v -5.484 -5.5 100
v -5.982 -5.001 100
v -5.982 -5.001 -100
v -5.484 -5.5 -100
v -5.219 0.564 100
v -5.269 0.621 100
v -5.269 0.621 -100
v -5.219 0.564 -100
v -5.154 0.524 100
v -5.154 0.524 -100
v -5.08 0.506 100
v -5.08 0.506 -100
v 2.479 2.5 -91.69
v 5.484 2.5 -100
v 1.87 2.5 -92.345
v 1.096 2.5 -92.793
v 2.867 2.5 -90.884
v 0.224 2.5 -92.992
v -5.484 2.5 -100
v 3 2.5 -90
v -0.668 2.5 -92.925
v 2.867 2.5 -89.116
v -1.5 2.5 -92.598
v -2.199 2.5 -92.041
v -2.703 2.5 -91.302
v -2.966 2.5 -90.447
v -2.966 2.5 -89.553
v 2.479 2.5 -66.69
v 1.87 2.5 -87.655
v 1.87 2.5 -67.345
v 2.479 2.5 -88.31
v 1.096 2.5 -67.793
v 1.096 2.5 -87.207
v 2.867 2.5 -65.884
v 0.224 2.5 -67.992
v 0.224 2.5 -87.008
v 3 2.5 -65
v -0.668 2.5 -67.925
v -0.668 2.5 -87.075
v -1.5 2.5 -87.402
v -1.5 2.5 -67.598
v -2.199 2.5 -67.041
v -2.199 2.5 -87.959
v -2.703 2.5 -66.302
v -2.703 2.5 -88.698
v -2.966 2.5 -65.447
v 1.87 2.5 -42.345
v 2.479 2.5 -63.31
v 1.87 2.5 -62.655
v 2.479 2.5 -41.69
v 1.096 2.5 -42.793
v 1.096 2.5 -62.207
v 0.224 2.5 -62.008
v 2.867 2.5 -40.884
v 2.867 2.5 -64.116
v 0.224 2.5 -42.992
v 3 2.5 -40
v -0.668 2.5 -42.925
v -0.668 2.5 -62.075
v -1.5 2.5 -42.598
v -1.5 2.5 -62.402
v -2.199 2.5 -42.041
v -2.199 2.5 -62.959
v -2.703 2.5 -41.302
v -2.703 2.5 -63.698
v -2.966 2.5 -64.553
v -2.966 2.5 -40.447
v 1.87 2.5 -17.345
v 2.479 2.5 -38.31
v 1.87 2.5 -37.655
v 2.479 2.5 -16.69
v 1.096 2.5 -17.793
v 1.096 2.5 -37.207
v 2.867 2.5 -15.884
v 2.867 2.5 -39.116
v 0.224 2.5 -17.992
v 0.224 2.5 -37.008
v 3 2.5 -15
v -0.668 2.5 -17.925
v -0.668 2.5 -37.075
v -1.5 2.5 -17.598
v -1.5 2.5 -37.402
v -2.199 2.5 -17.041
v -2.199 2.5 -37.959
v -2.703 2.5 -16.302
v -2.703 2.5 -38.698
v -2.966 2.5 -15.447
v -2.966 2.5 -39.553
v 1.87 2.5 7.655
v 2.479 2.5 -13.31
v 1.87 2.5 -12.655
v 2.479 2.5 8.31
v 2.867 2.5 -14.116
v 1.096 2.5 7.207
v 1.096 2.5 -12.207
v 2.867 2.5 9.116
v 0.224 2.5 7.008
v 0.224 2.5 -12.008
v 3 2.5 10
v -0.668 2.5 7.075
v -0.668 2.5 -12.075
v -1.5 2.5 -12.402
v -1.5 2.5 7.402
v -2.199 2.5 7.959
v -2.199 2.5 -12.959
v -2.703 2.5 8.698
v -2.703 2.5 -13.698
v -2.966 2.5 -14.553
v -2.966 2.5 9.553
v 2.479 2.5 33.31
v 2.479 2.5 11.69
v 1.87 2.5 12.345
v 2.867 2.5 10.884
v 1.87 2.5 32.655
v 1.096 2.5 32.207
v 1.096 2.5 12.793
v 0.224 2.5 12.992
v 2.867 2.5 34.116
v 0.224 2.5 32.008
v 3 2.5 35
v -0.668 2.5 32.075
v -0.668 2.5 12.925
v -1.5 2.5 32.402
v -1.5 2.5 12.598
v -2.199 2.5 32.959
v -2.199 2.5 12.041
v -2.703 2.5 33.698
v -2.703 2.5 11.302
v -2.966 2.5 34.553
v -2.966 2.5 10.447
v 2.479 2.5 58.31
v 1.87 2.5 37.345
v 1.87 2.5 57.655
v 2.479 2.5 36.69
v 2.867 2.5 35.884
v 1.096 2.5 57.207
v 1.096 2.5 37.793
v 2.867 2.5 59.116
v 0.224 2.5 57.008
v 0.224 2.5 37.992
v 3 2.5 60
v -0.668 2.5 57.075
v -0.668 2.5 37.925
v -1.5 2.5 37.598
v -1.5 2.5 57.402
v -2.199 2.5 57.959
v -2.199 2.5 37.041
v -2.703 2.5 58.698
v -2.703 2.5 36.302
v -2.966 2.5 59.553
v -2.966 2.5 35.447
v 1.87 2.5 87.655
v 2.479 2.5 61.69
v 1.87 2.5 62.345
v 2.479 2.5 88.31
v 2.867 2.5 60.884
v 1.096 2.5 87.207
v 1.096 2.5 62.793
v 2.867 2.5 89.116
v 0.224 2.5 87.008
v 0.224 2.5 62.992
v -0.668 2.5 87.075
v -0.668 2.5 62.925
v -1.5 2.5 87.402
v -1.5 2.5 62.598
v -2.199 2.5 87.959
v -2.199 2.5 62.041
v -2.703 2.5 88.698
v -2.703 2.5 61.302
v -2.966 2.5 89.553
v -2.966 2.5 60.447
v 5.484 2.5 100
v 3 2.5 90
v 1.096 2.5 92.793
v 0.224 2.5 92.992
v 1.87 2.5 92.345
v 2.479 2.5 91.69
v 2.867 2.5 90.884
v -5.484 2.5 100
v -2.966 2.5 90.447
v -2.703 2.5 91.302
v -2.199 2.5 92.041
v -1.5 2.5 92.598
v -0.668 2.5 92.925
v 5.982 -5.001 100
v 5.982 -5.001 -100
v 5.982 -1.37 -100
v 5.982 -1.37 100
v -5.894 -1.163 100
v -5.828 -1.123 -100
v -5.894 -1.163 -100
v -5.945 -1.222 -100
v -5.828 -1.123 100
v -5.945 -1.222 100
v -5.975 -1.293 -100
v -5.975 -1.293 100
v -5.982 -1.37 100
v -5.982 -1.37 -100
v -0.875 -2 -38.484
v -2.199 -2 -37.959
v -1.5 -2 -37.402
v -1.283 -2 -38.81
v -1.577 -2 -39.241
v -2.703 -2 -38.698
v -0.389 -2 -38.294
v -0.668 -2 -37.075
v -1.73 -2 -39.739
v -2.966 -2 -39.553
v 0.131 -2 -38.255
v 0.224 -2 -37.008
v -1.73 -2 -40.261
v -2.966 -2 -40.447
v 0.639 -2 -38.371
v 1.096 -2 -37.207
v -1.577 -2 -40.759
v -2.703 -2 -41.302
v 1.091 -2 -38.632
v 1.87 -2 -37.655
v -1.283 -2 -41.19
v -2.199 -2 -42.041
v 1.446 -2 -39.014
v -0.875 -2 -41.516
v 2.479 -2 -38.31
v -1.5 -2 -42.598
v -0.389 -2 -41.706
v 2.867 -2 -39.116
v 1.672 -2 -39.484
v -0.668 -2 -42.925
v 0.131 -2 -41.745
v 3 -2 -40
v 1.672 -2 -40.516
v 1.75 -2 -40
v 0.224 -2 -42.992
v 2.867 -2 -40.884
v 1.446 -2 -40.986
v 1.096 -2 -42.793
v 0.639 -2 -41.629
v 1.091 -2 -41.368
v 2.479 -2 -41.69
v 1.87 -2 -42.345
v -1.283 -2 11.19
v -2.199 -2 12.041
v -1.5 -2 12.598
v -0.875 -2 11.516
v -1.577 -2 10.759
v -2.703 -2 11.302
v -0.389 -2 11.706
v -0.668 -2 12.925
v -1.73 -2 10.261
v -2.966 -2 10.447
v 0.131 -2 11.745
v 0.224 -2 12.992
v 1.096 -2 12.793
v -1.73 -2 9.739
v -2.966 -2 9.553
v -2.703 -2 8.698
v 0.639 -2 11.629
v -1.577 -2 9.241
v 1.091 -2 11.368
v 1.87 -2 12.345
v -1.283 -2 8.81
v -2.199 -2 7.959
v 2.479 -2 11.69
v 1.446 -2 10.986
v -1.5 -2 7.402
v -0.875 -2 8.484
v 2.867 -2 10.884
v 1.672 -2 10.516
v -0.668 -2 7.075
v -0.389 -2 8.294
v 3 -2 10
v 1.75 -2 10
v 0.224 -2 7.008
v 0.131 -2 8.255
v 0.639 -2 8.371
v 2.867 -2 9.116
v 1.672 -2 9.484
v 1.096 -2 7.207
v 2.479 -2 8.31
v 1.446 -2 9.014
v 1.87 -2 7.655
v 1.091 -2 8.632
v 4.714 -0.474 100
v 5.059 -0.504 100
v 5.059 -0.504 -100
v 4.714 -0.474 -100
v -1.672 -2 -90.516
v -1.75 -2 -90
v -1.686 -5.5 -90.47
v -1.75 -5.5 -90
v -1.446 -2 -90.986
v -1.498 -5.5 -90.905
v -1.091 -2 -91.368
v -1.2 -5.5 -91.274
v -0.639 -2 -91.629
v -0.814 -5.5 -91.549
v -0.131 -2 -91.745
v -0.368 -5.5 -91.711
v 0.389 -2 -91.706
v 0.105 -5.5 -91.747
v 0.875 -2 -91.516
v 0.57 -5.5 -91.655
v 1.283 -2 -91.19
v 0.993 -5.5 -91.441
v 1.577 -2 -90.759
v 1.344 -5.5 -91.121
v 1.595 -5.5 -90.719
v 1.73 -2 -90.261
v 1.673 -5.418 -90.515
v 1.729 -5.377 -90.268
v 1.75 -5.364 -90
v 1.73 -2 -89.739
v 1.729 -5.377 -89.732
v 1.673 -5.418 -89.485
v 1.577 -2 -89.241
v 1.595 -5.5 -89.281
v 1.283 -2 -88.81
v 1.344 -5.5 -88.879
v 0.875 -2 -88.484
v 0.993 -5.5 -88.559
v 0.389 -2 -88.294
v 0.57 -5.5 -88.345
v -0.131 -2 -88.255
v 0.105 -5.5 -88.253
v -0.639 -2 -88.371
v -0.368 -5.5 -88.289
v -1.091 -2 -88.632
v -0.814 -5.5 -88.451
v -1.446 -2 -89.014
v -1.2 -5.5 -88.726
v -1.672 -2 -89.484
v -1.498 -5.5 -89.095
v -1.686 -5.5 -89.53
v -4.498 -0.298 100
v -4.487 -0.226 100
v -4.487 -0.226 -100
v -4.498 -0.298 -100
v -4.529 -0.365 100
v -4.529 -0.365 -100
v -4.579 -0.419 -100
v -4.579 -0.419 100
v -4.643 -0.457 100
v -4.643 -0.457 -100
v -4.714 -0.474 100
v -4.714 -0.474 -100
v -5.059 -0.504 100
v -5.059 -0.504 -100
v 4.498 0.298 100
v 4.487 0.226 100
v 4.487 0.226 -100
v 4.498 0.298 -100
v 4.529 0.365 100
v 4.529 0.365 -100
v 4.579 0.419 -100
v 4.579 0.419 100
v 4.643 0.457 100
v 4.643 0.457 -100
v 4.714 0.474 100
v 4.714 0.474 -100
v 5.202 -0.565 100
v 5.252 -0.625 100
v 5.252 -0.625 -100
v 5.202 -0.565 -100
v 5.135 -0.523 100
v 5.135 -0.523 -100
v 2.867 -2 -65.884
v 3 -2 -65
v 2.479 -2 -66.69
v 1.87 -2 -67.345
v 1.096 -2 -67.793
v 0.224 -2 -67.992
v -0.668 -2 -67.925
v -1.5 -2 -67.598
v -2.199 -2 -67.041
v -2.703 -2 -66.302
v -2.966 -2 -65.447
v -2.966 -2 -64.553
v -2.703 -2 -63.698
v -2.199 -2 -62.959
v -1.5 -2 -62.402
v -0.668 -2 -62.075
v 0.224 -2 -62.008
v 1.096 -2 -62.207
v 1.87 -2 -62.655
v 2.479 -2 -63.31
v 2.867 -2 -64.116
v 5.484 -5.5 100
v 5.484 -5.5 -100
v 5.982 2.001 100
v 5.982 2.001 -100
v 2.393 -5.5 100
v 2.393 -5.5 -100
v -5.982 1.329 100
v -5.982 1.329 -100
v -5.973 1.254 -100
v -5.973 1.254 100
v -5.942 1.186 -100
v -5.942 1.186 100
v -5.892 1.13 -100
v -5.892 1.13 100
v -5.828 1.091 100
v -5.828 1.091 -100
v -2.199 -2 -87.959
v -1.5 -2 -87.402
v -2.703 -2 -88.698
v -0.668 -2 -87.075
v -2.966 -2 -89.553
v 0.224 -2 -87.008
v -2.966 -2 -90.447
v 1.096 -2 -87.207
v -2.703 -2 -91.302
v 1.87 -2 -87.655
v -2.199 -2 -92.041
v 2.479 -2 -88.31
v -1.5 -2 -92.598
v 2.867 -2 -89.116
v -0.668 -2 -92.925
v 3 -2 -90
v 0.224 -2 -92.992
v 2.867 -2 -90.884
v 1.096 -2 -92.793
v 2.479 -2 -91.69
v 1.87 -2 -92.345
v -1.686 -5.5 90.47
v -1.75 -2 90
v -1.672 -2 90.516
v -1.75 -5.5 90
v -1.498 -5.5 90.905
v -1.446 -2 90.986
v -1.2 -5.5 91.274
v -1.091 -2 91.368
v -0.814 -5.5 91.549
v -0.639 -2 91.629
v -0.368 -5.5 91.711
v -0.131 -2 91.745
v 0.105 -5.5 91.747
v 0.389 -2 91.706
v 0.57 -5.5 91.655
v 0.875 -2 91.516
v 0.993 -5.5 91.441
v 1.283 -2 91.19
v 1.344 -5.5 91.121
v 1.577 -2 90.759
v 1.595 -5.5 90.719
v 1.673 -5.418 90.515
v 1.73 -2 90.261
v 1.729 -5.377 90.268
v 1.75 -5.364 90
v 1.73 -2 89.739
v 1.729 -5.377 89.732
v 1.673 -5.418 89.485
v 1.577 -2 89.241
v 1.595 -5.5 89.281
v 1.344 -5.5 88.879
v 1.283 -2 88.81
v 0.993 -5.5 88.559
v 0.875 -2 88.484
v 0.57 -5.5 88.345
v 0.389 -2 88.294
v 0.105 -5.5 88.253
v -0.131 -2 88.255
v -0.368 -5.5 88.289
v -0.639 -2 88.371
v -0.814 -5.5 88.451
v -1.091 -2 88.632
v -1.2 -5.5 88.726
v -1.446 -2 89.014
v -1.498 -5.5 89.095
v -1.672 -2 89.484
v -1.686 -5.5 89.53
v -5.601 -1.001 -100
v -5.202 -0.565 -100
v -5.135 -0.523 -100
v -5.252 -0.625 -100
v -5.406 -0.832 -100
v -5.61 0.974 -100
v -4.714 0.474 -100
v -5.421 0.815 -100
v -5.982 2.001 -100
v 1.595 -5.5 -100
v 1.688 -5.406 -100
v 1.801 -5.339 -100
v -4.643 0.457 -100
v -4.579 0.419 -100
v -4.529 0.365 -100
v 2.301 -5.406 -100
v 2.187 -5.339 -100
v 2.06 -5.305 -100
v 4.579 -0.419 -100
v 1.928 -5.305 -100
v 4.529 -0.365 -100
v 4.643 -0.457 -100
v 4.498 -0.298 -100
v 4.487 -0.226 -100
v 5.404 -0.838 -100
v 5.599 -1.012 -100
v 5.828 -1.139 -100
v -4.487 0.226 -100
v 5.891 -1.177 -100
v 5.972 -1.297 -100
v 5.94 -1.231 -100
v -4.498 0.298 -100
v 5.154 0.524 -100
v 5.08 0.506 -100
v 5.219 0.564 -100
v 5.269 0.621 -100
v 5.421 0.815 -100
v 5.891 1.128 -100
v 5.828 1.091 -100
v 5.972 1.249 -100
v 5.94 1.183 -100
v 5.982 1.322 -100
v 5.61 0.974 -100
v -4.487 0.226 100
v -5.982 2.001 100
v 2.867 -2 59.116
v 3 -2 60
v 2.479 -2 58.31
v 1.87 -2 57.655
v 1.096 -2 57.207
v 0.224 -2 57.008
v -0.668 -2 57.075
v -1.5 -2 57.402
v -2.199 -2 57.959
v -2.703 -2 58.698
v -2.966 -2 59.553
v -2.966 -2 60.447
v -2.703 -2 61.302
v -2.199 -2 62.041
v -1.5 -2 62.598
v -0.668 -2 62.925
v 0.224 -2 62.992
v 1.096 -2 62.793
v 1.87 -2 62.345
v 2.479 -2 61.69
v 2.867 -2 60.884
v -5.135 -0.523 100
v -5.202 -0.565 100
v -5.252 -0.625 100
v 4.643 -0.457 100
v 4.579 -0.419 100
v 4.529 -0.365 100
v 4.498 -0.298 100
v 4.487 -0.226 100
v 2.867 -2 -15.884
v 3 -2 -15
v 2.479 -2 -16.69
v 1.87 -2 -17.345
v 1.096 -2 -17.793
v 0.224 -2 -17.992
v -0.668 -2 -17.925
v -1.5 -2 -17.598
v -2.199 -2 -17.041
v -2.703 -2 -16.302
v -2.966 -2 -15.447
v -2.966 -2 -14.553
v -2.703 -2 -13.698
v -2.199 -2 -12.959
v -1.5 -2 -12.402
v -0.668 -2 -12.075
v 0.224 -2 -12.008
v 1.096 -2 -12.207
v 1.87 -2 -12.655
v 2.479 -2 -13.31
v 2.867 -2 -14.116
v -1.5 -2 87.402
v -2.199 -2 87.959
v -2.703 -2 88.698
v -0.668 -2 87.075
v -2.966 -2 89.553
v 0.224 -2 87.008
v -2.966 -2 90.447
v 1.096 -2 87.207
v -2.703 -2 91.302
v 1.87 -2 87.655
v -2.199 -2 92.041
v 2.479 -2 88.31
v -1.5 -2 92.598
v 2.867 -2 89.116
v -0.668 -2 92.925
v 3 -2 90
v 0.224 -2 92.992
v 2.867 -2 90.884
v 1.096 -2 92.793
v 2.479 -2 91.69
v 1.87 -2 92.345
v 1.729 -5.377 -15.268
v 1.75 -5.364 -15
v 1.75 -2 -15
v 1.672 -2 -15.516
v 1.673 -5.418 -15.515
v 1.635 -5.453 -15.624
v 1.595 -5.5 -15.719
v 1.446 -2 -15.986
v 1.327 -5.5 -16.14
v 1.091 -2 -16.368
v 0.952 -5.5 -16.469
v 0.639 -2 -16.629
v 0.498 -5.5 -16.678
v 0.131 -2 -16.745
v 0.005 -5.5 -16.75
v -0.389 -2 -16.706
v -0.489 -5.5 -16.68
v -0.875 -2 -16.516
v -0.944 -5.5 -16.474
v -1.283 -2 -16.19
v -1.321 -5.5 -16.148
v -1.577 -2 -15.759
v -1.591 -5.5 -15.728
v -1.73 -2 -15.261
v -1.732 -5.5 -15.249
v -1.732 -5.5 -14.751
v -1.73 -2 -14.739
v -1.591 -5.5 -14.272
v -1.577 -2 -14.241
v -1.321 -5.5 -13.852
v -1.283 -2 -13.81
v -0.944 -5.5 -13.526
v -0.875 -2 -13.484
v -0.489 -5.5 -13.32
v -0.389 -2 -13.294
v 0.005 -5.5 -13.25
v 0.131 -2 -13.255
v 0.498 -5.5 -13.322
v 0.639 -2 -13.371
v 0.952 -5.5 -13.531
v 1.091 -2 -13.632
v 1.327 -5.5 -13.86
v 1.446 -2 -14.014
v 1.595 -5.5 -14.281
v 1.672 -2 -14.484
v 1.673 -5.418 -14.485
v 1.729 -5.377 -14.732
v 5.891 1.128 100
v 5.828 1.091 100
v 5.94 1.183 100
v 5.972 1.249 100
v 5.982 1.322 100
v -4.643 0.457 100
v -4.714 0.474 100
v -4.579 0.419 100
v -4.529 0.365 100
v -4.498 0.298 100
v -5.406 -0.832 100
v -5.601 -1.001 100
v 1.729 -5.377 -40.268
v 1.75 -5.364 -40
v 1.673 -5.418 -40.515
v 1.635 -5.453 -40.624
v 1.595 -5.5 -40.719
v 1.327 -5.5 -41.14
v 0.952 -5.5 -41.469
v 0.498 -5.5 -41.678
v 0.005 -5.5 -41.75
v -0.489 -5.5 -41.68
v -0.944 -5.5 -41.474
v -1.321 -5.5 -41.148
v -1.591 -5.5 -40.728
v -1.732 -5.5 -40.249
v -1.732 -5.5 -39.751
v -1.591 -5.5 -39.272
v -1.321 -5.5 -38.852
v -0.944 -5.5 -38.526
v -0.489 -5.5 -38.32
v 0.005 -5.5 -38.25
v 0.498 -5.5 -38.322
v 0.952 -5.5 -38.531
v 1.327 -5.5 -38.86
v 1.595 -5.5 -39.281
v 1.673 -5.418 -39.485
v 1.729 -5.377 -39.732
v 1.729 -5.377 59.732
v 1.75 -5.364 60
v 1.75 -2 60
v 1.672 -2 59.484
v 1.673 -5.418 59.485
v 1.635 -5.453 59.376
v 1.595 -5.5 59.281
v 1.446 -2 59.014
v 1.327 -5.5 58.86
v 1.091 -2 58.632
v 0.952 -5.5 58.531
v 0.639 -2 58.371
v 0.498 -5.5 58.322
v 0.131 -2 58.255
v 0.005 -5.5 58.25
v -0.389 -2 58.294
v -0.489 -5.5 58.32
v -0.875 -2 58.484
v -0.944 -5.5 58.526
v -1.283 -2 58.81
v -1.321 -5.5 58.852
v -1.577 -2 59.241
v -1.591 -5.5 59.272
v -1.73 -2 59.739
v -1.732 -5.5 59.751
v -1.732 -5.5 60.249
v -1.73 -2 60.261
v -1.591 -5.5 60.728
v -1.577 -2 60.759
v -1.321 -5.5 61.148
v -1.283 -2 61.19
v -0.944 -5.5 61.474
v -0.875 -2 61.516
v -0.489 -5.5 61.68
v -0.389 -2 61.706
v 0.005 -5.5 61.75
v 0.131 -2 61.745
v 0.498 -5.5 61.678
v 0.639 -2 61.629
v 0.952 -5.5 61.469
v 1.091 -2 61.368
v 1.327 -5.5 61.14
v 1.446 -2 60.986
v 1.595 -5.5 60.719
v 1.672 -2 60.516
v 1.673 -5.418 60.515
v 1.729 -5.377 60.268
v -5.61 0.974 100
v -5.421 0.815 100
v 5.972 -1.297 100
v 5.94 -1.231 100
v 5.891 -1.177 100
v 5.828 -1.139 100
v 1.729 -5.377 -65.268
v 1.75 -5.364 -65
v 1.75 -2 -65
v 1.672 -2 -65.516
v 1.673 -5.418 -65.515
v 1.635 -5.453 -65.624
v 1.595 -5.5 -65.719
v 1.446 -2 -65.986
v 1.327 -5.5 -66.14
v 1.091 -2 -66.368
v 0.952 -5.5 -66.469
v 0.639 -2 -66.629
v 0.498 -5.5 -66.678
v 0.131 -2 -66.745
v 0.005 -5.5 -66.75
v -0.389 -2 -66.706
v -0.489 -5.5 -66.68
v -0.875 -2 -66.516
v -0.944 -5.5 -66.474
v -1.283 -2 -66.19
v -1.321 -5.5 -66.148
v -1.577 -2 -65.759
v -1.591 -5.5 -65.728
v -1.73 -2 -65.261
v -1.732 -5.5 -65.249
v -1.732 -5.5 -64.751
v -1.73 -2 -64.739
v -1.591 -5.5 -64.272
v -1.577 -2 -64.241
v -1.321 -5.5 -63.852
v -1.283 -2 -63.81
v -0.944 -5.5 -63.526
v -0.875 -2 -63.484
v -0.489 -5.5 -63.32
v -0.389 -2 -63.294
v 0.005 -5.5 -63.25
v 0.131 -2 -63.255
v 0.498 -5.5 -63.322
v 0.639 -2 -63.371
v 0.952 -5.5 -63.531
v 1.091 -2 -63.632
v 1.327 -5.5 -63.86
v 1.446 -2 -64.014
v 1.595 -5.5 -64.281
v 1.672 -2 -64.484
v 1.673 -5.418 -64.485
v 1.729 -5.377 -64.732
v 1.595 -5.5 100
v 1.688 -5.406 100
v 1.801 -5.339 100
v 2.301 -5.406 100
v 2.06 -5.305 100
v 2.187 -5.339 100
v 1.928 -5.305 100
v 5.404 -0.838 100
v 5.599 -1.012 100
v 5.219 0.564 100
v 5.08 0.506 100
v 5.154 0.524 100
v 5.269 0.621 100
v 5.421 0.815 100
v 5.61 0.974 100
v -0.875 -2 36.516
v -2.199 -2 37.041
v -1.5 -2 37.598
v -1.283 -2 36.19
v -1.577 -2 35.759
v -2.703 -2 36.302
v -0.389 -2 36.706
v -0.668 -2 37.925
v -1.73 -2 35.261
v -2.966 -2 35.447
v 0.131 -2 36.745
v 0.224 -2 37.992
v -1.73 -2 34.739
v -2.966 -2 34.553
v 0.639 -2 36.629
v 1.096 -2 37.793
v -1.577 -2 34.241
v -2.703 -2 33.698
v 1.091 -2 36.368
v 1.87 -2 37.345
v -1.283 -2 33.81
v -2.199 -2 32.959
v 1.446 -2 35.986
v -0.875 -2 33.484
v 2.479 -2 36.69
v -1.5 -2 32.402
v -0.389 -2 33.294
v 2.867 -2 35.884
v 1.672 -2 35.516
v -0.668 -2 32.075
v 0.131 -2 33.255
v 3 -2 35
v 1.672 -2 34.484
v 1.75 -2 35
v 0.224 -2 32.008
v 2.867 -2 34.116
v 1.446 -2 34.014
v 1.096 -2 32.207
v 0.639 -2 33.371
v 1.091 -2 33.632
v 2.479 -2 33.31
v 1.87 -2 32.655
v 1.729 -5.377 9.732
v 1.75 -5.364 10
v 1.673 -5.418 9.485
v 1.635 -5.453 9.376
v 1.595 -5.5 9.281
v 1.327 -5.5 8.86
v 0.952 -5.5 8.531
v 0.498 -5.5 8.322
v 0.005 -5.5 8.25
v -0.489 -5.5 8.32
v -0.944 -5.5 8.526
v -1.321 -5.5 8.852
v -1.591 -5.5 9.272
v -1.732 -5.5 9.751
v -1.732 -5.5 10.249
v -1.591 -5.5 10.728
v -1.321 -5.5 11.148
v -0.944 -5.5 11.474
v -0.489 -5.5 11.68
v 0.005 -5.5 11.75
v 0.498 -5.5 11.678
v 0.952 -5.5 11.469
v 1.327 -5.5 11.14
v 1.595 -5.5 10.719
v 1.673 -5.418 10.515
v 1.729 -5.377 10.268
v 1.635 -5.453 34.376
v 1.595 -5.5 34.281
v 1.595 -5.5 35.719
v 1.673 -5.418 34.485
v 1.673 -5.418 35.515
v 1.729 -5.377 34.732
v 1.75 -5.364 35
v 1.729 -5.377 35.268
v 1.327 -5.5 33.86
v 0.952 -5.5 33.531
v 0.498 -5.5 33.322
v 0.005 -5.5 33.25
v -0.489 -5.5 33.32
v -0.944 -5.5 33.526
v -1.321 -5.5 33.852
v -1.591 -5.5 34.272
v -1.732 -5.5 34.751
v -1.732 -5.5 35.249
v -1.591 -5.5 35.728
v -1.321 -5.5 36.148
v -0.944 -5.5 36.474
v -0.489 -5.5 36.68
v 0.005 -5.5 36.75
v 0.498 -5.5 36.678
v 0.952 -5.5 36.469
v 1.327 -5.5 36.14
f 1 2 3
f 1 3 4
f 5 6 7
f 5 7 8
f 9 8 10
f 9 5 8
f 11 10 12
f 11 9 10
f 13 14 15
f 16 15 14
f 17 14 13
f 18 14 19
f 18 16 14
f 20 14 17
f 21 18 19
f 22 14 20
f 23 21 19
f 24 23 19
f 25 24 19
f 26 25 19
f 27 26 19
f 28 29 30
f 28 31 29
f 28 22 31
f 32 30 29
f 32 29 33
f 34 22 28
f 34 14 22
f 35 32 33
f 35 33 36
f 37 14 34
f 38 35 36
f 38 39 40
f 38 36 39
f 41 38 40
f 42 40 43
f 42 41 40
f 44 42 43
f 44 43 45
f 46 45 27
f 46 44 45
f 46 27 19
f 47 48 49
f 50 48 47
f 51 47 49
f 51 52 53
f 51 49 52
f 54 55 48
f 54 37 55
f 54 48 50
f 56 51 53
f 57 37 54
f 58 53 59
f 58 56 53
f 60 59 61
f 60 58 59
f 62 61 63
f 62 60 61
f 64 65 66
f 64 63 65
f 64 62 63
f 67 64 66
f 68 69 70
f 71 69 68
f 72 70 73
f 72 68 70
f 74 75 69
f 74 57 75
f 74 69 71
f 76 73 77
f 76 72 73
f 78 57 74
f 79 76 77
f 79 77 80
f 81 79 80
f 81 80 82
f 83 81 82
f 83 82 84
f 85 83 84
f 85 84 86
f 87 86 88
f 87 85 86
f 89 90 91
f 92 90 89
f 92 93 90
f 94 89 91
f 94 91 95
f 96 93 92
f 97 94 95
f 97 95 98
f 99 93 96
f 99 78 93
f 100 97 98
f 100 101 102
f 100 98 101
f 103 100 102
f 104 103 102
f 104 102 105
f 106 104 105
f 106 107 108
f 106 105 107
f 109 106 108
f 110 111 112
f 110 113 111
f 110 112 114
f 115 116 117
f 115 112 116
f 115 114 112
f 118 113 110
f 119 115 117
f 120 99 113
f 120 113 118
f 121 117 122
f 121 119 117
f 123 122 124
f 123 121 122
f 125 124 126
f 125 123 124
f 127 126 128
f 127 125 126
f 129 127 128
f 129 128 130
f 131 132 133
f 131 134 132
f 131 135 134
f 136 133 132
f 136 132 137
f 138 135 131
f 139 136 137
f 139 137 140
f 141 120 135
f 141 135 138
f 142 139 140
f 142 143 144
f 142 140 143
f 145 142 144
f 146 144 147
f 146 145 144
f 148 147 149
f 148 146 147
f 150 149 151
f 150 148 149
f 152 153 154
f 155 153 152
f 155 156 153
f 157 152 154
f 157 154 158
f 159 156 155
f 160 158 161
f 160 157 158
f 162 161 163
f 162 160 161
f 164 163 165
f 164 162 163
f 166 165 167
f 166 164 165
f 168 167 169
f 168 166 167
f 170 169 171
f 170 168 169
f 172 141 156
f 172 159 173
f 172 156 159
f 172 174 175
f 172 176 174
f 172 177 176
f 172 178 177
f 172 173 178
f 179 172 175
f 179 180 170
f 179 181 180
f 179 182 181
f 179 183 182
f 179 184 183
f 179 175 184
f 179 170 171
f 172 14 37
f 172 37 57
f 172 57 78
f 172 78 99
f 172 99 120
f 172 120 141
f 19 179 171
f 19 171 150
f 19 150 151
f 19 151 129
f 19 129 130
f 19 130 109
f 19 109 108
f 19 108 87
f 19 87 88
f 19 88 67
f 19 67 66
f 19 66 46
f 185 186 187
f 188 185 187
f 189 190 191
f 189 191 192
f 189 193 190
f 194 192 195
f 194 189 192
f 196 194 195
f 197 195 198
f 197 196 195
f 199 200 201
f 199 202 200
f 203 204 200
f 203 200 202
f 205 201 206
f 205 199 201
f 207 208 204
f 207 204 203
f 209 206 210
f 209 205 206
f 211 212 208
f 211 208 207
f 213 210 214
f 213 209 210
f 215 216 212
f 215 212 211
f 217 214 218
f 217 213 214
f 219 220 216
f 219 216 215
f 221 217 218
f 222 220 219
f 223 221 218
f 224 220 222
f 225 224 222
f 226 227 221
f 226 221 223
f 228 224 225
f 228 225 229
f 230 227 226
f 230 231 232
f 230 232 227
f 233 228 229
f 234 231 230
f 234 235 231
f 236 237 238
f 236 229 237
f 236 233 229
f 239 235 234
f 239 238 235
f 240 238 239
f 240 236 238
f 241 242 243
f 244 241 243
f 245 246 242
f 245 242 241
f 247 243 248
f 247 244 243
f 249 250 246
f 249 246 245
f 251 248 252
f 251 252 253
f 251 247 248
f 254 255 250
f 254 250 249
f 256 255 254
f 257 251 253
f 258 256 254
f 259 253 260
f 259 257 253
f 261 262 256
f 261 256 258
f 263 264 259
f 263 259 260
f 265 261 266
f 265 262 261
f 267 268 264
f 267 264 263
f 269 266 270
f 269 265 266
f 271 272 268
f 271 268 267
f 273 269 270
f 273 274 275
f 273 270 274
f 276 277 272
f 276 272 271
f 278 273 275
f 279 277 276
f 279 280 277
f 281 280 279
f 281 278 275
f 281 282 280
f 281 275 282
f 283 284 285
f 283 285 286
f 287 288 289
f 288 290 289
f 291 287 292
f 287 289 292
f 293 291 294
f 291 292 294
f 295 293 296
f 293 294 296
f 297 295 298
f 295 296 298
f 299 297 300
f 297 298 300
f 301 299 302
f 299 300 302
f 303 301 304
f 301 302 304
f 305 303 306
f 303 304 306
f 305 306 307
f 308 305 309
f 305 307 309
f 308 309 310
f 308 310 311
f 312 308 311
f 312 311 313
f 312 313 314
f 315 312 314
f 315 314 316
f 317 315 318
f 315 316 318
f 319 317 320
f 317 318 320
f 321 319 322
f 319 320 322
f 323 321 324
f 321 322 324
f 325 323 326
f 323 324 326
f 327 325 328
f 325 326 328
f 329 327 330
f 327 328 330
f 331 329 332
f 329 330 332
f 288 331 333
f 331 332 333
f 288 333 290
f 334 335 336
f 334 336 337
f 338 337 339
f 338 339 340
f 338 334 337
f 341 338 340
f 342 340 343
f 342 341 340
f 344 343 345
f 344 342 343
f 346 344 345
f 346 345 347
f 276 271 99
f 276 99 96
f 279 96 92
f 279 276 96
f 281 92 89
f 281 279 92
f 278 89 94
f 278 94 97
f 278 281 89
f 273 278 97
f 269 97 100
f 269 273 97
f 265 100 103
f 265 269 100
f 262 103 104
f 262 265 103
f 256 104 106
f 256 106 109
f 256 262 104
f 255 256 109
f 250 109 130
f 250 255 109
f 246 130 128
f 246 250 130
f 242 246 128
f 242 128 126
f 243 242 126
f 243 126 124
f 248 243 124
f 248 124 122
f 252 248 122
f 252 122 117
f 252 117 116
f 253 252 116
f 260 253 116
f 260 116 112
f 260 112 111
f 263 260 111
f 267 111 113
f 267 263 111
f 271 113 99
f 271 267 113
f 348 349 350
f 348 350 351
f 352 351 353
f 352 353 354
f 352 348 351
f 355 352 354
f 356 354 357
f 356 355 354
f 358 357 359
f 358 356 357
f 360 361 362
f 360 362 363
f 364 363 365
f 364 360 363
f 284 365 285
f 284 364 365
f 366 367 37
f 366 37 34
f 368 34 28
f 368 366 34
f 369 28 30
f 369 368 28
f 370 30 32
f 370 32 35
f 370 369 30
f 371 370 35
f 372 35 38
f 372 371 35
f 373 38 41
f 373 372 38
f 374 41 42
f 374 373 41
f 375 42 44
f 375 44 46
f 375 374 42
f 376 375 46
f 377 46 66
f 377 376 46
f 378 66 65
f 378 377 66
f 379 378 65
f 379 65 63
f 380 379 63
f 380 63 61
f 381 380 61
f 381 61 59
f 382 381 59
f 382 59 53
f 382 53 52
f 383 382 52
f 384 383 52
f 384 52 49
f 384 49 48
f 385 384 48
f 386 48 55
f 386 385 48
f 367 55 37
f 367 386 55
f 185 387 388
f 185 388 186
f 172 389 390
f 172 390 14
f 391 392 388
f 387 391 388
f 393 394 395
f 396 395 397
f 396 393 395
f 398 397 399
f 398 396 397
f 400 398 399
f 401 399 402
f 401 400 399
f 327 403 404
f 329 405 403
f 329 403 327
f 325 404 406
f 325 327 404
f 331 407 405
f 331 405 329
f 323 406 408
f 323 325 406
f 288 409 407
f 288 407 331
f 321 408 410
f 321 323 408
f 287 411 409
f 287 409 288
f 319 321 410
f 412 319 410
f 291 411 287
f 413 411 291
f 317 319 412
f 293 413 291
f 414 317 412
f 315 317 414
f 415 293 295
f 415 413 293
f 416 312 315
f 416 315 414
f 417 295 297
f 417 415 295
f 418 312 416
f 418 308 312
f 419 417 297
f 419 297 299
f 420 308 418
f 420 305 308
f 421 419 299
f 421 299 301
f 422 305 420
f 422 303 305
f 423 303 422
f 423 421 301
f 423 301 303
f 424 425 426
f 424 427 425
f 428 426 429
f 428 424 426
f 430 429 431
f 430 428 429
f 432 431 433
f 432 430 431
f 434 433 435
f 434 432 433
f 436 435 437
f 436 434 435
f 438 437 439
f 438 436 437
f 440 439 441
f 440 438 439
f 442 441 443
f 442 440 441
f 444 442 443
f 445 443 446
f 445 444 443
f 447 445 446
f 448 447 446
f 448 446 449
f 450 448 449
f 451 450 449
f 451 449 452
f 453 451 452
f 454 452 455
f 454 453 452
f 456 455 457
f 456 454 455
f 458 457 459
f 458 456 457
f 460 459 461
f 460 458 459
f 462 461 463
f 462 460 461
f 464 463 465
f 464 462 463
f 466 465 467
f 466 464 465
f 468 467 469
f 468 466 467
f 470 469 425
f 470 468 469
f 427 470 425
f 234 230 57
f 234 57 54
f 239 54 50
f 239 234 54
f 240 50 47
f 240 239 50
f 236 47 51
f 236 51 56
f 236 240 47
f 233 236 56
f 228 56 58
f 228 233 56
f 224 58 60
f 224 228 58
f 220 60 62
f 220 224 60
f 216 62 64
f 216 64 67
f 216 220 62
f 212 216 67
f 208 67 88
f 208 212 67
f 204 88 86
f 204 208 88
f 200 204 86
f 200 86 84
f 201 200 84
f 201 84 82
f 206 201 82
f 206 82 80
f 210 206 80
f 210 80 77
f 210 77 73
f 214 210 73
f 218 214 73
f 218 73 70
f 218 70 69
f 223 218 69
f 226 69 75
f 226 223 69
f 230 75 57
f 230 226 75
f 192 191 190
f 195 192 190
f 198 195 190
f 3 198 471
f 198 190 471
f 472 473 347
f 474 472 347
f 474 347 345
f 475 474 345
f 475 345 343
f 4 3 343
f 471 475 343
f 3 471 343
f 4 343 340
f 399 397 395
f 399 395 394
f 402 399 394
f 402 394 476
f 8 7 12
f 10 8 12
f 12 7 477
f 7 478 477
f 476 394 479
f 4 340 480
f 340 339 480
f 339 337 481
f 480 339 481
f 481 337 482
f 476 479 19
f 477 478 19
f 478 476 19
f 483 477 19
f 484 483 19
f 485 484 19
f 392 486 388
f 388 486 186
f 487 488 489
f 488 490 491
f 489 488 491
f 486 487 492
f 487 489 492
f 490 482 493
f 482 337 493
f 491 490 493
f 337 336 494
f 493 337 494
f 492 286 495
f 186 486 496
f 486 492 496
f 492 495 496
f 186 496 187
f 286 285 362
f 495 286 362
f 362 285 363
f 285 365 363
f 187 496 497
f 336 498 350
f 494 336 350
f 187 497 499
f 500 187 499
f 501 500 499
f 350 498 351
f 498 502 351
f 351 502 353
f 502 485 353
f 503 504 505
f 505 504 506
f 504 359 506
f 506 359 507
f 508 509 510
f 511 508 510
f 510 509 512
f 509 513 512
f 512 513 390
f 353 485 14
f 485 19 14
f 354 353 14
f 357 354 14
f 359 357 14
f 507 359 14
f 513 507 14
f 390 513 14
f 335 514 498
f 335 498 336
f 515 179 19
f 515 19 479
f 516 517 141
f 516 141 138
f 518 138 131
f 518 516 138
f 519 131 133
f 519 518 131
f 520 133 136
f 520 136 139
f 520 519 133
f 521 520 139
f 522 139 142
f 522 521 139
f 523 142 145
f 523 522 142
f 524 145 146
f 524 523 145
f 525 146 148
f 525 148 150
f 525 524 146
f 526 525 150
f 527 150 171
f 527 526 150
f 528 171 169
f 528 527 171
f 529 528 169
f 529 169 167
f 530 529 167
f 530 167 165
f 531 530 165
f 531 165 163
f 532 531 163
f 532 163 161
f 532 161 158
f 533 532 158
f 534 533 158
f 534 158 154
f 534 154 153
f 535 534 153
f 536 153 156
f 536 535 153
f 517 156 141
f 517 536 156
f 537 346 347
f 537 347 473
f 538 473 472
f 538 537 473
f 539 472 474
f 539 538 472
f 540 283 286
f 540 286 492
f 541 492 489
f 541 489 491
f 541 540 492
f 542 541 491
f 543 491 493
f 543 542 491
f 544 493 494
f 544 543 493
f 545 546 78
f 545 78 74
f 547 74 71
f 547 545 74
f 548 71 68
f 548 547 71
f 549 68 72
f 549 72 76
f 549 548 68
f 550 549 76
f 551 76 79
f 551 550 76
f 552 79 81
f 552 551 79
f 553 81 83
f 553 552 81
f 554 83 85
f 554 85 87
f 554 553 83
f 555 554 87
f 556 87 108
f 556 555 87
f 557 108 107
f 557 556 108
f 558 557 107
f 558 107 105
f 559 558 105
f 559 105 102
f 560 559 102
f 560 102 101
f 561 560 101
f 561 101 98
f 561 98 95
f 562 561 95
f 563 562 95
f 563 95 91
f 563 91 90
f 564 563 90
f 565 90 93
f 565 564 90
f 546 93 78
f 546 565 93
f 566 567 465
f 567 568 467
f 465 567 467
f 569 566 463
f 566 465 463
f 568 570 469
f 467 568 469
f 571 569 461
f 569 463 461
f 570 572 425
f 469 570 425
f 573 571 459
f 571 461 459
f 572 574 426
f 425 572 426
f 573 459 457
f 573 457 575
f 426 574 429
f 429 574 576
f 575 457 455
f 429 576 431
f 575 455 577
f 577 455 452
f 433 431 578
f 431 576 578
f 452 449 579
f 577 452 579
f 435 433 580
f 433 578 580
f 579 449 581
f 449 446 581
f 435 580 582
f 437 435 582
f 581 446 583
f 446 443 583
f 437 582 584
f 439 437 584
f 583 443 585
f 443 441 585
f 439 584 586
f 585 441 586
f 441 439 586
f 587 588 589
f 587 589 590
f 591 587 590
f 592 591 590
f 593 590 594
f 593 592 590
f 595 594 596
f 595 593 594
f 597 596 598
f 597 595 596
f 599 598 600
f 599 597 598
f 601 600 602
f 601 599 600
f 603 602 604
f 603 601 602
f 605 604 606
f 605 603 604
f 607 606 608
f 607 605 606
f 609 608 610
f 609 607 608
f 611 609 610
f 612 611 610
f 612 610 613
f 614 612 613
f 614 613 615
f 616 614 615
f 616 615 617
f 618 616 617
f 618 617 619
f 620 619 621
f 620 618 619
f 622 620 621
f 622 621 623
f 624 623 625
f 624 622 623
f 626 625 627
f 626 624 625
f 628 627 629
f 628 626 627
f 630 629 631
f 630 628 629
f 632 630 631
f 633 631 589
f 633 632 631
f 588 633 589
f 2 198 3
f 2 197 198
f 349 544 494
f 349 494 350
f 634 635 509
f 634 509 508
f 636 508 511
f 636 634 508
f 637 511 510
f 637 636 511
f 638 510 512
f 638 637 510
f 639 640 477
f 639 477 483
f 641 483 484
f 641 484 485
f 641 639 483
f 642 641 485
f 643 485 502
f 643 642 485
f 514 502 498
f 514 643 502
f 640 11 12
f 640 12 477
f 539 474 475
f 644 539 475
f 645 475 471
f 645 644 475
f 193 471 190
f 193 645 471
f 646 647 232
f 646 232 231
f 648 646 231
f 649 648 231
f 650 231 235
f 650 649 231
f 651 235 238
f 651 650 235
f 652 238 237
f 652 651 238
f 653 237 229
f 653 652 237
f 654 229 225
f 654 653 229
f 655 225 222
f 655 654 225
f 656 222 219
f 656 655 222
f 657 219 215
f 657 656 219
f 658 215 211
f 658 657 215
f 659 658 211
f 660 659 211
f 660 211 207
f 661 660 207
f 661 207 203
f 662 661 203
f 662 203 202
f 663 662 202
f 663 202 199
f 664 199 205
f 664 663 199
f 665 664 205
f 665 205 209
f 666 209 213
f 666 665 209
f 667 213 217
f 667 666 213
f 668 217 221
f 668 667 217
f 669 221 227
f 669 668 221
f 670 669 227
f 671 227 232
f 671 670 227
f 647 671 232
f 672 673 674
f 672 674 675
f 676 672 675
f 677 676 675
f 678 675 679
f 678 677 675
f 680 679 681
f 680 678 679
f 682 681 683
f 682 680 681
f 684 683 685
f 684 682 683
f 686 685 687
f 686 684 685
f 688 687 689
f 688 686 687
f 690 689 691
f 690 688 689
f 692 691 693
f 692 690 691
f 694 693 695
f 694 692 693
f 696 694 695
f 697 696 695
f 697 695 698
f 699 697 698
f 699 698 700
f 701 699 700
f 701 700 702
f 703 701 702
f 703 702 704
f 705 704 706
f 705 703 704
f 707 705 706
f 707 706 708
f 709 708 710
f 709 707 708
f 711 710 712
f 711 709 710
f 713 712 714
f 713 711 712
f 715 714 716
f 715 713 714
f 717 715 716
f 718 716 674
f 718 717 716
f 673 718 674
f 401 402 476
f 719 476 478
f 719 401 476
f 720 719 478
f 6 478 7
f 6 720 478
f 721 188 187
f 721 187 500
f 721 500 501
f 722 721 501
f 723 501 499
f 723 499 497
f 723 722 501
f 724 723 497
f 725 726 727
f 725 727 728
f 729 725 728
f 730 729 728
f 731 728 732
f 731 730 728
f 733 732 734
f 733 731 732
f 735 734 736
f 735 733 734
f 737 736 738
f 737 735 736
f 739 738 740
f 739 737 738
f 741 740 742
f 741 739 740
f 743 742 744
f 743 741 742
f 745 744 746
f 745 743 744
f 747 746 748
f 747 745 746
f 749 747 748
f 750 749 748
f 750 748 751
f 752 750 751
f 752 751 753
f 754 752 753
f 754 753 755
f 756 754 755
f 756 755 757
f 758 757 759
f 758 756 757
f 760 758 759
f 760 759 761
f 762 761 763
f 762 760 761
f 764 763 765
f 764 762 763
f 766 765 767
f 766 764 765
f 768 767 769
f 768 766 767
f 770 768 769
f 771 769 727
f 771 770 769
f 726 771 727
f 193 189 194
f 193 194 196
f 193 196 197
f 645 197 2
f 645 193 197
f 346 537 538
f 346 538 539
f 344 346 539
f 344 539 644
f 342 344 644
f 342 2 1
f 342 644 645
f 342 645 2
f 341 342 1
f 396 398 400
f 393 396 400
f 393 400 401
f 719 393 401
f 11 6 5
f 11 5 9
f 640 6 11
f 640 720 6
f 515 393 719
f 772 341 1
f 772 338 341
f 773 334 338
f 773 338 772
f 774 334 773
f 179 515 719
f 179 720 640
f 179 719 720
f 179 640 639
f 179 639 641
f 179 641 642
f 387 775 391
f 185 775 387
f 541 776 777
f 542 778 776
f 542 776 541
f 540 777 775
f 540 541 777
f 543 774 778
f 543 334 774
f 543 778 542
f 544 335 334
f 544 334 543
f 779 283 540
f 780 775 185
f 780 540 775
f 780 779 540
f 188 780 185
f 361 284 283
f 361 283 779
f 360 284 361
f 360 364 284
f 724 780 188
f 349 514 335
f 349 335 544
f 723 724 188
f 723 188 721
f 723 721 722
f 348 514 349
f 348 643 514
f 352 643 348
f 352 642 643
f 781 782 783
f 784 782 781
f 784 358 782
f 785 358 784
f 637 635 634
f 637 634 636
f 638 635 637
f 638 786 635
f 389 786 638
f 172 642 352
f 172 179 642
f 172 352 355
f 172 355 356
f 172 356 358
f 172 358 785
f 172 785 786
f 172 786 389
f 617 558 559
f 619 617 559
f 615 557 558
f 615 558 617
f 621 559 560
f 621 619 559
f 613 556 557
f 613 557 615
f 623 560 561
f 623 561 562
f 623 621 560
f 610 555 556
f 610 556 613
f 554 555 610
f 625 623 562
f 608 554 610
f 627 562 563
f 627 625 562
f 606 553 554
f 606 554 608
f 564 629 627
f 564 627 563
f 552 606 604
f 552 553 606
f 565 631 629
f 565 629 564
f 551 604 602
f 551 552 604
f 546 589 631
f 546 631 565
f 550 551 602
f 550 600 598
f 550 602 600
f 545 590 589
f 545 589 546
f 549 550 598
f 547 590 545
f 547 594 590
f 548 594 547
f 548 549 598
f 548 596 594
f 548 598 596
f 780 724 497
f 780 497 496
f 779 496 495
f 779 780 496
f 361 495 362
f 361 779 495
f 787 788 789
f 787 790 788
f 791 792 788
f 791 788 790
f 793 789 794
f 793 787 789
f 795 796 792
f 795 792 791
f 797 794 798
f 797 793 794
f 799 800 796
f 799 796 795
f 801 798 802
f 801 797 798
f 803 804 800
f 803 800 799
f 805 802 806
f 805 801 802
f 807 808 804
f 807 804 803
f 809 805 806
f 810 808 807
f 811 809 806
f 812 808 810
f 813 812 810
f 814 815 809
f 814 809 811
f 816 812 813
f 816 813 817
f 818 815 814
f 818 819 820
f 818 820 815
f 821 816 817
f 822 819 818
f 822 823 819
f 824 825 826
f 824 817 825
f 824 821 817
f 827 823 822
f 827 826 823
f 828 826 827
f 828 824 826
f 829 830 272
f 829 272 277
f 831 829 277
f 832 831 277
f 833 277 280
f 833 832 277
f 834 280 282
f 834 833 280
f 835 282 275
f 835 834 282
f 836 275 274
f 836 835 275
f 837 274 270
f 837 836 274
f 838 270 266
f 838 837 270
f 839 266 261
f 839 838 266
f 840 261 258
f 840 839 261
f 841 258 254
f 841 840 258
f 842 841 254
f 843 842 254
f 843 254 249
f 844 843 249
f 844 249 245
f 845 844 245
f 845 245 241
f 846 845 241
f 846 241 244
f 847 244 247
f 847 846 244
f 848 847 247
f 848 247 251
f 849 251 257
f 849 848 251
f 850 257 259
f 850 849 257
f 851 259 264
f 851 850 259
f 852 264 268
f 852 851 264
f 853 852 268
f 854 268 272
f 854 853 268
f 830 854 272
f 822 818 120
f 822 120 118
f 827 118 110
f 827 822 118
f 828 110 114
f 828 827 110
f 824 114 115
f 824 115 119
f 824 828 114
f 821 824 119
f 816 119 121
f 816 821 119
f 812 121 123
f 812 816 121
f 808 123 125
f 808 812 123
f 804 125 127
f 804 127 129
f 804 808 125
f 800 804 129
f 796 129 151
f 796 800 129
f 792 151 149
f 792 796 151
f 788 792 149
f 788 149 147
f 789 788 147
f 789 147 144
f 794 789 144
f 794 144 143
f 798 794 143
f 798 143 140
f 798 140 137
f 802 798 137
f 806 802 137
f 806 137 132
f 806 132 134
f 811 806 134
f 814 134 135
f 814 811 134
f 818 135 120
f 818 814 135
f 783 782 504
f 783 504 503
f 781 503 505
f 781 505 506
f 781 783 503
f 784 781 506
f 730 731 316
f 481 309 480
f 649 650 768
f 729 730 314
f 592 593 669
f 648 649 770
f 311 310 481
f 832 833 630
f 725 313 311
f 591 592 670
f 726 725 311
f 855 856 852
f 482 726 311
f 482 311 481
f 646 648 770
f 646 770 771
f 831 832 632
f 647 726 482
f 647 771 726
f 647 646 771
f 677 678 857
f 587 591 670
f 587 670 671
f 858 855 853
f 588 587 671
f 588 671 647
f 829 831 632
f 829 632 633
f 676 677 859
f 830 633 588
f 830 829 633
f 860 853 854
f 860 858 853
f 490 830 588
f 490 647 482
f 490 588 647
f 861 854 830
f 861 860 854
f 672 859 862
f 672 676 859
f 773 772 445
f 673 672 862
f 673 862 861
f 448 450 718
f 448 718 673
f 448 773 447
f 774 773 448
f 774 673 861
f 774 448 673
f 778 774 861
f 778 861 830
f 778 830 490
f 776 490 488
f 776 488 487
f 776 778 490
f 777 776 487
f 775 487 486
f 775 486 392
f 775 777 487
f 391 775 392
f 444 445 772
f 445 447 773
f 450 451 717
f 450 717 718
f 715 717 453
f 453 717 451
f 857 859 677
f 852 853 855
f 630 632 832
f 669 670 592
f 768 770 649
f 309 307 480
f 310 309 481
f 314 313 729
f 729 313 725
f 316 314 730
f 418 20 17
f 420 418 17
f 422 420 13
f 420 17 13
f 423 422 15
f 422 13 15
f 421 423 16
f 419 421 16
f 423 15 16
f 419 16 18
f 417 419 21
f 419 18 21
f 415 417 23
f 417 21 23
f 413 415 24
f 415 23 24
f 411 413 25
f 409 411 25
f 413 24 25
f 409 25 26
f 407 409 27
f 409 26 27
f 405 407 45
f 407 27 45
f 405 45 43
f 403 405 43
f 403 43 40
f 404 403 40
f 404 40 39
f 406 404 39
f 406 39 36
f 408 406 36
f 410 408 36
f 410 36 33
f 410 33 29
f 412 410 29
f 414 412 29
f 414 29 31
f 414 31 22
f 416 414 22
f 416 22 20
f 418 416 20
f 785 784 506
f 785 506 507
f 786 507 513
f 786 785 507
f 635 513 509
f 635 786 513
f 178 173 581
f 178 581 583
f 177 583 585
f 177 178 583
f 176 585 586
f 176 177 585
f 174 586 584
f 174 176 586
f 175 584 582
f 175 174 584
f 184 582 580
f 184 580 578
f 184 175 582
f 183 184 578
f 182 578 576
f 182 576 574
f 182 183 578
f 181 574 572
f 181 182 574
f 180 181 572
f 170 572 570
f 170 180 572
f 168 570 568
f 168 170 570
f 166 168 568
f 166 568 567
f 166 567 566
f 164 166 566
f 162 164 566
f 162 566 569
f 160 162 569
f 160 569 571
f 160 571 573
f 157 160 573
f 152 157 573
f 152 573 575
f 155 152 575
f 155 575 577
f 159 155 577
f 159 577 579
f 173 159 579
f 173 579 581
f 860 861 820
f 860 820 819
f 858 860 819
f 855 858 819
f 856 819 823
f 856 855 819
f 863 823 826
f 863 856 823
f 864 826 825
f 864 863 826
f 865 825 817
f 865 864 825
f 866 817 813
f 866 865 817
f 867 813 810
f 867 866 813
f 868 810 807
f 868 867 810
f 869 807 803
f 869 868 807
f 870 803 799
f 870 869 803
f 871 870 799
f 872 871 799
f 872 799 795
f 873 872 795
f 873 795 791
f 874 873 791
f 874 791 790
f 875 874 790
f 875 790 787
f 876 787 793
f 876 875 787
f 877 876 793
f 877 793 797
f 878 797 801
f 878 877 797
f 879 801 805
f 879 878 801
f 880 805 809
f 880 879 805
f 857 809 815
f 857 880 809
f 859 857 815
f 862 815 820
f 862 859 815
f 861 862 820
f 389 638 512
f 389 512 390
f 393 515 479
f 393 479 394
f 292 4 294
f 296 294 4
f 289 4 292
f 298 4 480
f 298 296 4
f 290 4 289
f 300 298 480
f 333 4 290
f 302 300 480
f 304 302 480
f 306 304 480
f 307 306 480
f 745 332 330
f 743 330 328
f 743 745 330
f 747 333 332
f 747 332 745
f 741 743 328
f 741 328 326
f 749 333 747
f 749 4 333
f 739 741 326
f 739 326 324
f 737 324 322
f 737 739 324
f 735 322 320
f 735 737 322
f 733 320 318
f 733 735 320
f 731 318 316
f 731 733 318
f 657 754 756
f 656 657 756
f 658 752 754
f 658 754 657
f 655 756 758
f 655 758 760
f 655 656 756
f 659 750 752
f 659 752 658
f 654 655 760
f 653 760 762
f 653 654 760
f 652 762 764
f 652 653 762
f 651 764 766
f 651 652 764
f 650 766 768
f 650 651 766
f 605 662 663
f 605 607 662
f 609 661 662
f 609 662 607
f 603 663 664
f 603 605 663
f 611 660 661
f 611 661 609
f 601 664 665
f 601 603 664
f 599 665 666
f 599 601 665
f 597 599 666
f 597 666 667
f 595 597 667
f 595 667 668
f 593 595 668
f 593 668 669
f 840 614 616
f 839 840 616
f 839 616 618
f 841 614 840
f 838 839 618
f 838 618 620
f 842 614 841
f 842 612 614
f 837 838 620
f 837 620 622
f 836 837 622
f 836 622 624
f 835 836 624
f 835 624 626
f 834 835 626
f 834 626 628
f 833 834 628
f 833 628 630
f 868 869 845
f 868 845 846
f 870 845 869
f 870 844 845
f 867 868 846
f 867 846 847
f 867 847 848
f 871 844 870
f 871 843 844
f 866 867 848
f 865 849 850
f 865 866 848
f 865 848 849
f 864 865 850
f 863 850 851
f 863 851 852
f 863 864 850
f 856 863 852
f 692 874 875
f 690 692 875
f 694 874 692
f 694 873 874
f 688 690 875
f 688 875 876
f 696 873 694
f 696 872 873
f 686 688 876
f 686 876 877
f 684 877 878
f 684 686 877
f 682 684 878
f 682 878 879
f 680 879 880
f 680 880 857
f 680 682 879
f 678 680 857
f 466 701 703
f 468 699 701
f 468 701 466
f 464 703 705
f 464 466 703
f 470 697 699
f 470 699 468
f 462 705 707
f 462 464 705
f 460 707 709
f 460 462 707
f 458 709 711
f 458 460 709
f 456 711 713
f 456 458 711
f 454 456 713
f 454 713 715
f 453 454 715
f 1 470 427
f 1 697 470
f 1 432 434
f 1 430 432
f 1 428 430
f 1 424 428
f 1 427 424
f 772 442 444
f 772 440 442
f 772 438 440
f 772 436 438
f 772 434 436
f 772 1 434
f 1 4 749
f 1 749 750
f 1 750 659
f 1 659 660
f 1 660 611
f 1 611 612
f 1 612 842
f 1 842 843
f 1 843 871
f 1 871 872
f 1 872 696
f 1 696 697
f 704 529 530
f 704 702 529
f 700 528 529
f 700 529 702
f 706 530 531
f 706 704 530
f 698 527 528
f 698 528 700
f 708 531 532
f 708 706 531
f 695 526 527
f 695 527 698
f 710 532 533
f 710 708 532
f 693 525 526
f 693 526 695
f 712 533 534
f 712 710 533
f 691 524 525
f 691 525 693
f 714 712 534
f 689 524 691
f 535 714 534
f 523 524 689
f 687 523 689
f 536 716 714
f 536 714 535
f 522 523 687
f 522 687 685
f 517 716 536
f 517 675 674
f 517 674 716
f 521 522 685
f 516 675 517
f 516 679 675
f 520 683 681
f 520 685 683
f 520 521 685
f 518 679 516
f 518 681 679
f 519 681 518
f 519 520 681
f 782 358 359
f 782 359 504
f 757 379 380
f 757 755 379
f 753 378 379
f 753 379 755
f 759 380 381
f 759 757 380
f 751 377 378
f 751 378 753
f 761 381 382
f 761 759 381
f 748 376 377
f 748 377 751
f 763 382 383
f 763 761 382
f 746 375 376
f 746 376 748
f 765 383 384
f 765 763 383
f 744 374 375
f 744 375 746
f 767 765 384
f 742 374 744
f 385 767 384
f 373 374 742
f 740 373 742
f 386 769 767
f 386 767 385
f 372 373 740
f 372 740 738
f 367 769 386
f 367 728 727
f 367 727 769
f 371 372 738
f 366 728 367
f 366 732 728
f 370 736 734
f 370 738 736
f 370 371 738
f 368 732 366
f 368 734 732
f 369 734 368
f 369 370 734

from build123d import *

# Parameters (mm, degrees)
RAIL_PROFILE_DEPTH             = 100
CBORE_FOR_M3_SHCS1_D           = 3.5
CBORE_FOR_M3_SHCS1_CBORE_D     = 6
CBORE_FOR_M3_SHCS1_CBORE_DEPTH = 4.5
FILL_START                     = -2.000000001
FILL_PATTERN1_OUTLINE_R        = 3
FILL_PATTERN1_DEPTH            = 4.5
FILL_START_2                   = -5.5
FILL_PATTERN1_2_OUTLINE_R      = 1.75
FILL_PATTERN1_2_DEPTH          = 3.499999999


# Read off the part's stored shape, not the designer's step: Fill Pattern1
with BuildPart() as part:
    # Sketch1 → RAIL PROFILE (new, symmetric)
    with BuildSketch(Plane.XY):
        with BuildLine():
            Line((-5.982334879, -1.370069213), (-5.982334879, -5.001472146))
            Line((-5.982334879, -5.001472146), (-5.483807025, -5.499999999))
            Line((-5.483807025, -5.499999999), (1.595289228, -5.499999999))
            ThreePointArc((1.595289228, -5.499999999), (1.994111552, -5.300588838), (2.392933875, -5.5))
            Line((2.392933875, -5.5), (5.483807024, -5.5))
            Line((5.483807024, -5.5), (5.982334878, -5.001472147))
            Line((5.982334878, -5.001472147), (5.982334878, -1.370069213))
            ThreePointArc((5.982334878, -1.370069213), (5.940056641, -1.231182813), (5.82756375, -1.139410101))
            ThreePointArc((5.82756375, -1.139410101), (5.497041405, -0.930122348), (5.251697363, -0.625405104))
            ThreePointArc((5.251697363, -0.625405104), (5.169975597, -0.541388466), (5.058890009, -0.504008866))
            Line((5.058890009, -0.504008866), (4.71429032, -0.473860299))
            ThreePointArc((4.71429032, -0.473860299), (4.552238438, -0.393945155), (4.486751147, -0.225544865))
            Line((4.486751147, -0.225544865), (4.486751147, 0.225544865))
            ThreePointArc((4.486751147, 0.225544865), (4.552238438, 0.393945155), (4.71429032, 0.473860299))
            Line((4.71429032, 0.473860299), (5.079776582, 0.505836204))
            ThreePointArc((5.079776582, 0.505836204), (5.187925163, 0.5413949), (5.268982803, 0.621333598))
            ThreePointArc((5.268982803, 0.621333598), (5.511607978, 0.899707672), (5.82756375, 1.09083865))
            ThreePointArc((5.82756375, 1.09083865), (5.940040963, 1.182638806), (5.982312115, 1.321532803))
            Line((5.982312115, 1.321532803), (5.982321902, 2.00145917))
            Line((5.982321902, 2.00145917), (5.483807025, 2.499999999))
            Line((5.483807025, 2.499999999), (-5.483807026, 2.499999999))
            Line((-5.483807026, 2.499999999), (-5.982321903, 2.00145917))
            Line((-5.982321903, 2.00145917), (-5.982321903, 1.32884687))
            ThreePointArc((-5.982321903, 1.32884687), (-5.942177076, 1.185718341), (-5.827697321, 1.090893402))
            ThreePointArc((-5.827697321, 1.090893402), (-5.511663234, 0.899754111), (-5.268982805, 0.621333597))
            ThreePointArc((-5.268982805, 0.621333597), (-5.187925164, 0.541394898), (-5.079776582, 0.505836204))
            Line((-5.079776582, 0.505836204), (-4.71429032, 0.473860299))
            ThreePointArc((-4.71429032, 0.473860299), (-4.552238438, 0.393945155), (-4.486751147, 0.225544865))
            Line((-4.486751147, 0.225544865), (-4.486751147, -0.225544865))
            ThreePointArc((-4.486751147, -0.225544865), (-4.552238438, -0.393945155), (-4.71429032, -0.473860299))
            Line((-4.71429032, -0.473860299), (-5.058890009, -0.504008866))
            ThreePointArc((-5.058890009, -0.504008866), (-5.169975597, -0.541388466), (-5.251697363, -0.625405104))
            ThreePointArc((-5.251697363, -0.625405104), (-5.499180752, -0.921502608), (-5.828043428, -1.123421157))
            ThreePointArc((-5.828043428, -1.123421157), (-5.944906256, -1.221900029), (-5.982334879, -1.370069213))
        make_face()
    extrude(amount=RAIL_PROFILE_DEPTH, both=True)

    # CBORE for M3 SHCS1 (through all)
    with Locations(Plane(origin=(0, 2.499999999, 0), x_dir=(1, 0, 0), z_dir=(0, 1, 0))):
        with Locations((0, 90)):
            cbore_for_m3_shcs1 = CounterBoreHole(CBORE_FOR_M3_SHCS1_D / 2, CBORE_FOR_M3_SHCS1_CBORE_D / 2, CBORE_FOR_M3_SHCS1_CBORE_DEPTH)

    # M3 END MIRROR: CBORE for M3 SHCS1 across plane
    add(cbore_for_m3_shcs1.mirror(Plane.XY), mode=Mode.SUBTRACT)

    # Fill Pattern1 outline → Fill Pattern1 (cut)
    with BuildSketch(Plane(origin=(0, 0, 0), x_dir=(1, 0, 0), z_dir=(0, 1, 0)).offset(FILL_START)):
        with Locations((0, 65)):
            Circle(FILL_PATTERN1_OUTLINE_R)
        with Locations((0, 40)):
            Circle(FILL_PATTERN1_OUTLINE_R)
        with Locations((0, 15)):
            Circle(FILL_PATTERN1_OUTLINE_R)
        with Locations((0, -10)):
            Circle(FILL_PATTERN1_OUTLINE_R)
        with Locations((0, -35)):
            Circle(FILL_PATTERN1_OUTLINE_R)
        with Locations((0, -60)):
            Circle(FILL_PATTERN1_OUTLINE_R)
    extrude(amount=FILL_PATTERN1_DEPTH, mode=Mode.SUBTRACT)

    # Fill Pattern1 2 outline → Fill Pattern1 2 (cut)
    with BuildSketch(Plane(origin=(0, 0, 0), x_dir=(1, 0, 0), z_dir=(0, 1, 0)).offset(FILL_START_2)):
        with Locations((0, 65)):
            Circle(FILL_PATTERN1_2_OUTLINE_R)
        with Locations((0, 40)):
            Circle(FILL_PATTERN1_2_OUTLINE_R)
        with Locations((0, 15)):
            Circle(FILL_PATTERN1_2_OUTLINE_R)
        with Locations((0, -10)):
            Circle(FILL_PATTERN1_2_OUTLINE_R)
        with Locations((0, -35)):
            Circle(FILL_PATTERN1_2_OUTLINE_R)
        with Locations((0, -60)):
            Circle(FILL_PATTERN1_2_OUTLINE_R)
    extrude(amount=FILL_PATTERN1_2_DEPTH, mode=Mode.SUBTRACT)


solid = part.part
